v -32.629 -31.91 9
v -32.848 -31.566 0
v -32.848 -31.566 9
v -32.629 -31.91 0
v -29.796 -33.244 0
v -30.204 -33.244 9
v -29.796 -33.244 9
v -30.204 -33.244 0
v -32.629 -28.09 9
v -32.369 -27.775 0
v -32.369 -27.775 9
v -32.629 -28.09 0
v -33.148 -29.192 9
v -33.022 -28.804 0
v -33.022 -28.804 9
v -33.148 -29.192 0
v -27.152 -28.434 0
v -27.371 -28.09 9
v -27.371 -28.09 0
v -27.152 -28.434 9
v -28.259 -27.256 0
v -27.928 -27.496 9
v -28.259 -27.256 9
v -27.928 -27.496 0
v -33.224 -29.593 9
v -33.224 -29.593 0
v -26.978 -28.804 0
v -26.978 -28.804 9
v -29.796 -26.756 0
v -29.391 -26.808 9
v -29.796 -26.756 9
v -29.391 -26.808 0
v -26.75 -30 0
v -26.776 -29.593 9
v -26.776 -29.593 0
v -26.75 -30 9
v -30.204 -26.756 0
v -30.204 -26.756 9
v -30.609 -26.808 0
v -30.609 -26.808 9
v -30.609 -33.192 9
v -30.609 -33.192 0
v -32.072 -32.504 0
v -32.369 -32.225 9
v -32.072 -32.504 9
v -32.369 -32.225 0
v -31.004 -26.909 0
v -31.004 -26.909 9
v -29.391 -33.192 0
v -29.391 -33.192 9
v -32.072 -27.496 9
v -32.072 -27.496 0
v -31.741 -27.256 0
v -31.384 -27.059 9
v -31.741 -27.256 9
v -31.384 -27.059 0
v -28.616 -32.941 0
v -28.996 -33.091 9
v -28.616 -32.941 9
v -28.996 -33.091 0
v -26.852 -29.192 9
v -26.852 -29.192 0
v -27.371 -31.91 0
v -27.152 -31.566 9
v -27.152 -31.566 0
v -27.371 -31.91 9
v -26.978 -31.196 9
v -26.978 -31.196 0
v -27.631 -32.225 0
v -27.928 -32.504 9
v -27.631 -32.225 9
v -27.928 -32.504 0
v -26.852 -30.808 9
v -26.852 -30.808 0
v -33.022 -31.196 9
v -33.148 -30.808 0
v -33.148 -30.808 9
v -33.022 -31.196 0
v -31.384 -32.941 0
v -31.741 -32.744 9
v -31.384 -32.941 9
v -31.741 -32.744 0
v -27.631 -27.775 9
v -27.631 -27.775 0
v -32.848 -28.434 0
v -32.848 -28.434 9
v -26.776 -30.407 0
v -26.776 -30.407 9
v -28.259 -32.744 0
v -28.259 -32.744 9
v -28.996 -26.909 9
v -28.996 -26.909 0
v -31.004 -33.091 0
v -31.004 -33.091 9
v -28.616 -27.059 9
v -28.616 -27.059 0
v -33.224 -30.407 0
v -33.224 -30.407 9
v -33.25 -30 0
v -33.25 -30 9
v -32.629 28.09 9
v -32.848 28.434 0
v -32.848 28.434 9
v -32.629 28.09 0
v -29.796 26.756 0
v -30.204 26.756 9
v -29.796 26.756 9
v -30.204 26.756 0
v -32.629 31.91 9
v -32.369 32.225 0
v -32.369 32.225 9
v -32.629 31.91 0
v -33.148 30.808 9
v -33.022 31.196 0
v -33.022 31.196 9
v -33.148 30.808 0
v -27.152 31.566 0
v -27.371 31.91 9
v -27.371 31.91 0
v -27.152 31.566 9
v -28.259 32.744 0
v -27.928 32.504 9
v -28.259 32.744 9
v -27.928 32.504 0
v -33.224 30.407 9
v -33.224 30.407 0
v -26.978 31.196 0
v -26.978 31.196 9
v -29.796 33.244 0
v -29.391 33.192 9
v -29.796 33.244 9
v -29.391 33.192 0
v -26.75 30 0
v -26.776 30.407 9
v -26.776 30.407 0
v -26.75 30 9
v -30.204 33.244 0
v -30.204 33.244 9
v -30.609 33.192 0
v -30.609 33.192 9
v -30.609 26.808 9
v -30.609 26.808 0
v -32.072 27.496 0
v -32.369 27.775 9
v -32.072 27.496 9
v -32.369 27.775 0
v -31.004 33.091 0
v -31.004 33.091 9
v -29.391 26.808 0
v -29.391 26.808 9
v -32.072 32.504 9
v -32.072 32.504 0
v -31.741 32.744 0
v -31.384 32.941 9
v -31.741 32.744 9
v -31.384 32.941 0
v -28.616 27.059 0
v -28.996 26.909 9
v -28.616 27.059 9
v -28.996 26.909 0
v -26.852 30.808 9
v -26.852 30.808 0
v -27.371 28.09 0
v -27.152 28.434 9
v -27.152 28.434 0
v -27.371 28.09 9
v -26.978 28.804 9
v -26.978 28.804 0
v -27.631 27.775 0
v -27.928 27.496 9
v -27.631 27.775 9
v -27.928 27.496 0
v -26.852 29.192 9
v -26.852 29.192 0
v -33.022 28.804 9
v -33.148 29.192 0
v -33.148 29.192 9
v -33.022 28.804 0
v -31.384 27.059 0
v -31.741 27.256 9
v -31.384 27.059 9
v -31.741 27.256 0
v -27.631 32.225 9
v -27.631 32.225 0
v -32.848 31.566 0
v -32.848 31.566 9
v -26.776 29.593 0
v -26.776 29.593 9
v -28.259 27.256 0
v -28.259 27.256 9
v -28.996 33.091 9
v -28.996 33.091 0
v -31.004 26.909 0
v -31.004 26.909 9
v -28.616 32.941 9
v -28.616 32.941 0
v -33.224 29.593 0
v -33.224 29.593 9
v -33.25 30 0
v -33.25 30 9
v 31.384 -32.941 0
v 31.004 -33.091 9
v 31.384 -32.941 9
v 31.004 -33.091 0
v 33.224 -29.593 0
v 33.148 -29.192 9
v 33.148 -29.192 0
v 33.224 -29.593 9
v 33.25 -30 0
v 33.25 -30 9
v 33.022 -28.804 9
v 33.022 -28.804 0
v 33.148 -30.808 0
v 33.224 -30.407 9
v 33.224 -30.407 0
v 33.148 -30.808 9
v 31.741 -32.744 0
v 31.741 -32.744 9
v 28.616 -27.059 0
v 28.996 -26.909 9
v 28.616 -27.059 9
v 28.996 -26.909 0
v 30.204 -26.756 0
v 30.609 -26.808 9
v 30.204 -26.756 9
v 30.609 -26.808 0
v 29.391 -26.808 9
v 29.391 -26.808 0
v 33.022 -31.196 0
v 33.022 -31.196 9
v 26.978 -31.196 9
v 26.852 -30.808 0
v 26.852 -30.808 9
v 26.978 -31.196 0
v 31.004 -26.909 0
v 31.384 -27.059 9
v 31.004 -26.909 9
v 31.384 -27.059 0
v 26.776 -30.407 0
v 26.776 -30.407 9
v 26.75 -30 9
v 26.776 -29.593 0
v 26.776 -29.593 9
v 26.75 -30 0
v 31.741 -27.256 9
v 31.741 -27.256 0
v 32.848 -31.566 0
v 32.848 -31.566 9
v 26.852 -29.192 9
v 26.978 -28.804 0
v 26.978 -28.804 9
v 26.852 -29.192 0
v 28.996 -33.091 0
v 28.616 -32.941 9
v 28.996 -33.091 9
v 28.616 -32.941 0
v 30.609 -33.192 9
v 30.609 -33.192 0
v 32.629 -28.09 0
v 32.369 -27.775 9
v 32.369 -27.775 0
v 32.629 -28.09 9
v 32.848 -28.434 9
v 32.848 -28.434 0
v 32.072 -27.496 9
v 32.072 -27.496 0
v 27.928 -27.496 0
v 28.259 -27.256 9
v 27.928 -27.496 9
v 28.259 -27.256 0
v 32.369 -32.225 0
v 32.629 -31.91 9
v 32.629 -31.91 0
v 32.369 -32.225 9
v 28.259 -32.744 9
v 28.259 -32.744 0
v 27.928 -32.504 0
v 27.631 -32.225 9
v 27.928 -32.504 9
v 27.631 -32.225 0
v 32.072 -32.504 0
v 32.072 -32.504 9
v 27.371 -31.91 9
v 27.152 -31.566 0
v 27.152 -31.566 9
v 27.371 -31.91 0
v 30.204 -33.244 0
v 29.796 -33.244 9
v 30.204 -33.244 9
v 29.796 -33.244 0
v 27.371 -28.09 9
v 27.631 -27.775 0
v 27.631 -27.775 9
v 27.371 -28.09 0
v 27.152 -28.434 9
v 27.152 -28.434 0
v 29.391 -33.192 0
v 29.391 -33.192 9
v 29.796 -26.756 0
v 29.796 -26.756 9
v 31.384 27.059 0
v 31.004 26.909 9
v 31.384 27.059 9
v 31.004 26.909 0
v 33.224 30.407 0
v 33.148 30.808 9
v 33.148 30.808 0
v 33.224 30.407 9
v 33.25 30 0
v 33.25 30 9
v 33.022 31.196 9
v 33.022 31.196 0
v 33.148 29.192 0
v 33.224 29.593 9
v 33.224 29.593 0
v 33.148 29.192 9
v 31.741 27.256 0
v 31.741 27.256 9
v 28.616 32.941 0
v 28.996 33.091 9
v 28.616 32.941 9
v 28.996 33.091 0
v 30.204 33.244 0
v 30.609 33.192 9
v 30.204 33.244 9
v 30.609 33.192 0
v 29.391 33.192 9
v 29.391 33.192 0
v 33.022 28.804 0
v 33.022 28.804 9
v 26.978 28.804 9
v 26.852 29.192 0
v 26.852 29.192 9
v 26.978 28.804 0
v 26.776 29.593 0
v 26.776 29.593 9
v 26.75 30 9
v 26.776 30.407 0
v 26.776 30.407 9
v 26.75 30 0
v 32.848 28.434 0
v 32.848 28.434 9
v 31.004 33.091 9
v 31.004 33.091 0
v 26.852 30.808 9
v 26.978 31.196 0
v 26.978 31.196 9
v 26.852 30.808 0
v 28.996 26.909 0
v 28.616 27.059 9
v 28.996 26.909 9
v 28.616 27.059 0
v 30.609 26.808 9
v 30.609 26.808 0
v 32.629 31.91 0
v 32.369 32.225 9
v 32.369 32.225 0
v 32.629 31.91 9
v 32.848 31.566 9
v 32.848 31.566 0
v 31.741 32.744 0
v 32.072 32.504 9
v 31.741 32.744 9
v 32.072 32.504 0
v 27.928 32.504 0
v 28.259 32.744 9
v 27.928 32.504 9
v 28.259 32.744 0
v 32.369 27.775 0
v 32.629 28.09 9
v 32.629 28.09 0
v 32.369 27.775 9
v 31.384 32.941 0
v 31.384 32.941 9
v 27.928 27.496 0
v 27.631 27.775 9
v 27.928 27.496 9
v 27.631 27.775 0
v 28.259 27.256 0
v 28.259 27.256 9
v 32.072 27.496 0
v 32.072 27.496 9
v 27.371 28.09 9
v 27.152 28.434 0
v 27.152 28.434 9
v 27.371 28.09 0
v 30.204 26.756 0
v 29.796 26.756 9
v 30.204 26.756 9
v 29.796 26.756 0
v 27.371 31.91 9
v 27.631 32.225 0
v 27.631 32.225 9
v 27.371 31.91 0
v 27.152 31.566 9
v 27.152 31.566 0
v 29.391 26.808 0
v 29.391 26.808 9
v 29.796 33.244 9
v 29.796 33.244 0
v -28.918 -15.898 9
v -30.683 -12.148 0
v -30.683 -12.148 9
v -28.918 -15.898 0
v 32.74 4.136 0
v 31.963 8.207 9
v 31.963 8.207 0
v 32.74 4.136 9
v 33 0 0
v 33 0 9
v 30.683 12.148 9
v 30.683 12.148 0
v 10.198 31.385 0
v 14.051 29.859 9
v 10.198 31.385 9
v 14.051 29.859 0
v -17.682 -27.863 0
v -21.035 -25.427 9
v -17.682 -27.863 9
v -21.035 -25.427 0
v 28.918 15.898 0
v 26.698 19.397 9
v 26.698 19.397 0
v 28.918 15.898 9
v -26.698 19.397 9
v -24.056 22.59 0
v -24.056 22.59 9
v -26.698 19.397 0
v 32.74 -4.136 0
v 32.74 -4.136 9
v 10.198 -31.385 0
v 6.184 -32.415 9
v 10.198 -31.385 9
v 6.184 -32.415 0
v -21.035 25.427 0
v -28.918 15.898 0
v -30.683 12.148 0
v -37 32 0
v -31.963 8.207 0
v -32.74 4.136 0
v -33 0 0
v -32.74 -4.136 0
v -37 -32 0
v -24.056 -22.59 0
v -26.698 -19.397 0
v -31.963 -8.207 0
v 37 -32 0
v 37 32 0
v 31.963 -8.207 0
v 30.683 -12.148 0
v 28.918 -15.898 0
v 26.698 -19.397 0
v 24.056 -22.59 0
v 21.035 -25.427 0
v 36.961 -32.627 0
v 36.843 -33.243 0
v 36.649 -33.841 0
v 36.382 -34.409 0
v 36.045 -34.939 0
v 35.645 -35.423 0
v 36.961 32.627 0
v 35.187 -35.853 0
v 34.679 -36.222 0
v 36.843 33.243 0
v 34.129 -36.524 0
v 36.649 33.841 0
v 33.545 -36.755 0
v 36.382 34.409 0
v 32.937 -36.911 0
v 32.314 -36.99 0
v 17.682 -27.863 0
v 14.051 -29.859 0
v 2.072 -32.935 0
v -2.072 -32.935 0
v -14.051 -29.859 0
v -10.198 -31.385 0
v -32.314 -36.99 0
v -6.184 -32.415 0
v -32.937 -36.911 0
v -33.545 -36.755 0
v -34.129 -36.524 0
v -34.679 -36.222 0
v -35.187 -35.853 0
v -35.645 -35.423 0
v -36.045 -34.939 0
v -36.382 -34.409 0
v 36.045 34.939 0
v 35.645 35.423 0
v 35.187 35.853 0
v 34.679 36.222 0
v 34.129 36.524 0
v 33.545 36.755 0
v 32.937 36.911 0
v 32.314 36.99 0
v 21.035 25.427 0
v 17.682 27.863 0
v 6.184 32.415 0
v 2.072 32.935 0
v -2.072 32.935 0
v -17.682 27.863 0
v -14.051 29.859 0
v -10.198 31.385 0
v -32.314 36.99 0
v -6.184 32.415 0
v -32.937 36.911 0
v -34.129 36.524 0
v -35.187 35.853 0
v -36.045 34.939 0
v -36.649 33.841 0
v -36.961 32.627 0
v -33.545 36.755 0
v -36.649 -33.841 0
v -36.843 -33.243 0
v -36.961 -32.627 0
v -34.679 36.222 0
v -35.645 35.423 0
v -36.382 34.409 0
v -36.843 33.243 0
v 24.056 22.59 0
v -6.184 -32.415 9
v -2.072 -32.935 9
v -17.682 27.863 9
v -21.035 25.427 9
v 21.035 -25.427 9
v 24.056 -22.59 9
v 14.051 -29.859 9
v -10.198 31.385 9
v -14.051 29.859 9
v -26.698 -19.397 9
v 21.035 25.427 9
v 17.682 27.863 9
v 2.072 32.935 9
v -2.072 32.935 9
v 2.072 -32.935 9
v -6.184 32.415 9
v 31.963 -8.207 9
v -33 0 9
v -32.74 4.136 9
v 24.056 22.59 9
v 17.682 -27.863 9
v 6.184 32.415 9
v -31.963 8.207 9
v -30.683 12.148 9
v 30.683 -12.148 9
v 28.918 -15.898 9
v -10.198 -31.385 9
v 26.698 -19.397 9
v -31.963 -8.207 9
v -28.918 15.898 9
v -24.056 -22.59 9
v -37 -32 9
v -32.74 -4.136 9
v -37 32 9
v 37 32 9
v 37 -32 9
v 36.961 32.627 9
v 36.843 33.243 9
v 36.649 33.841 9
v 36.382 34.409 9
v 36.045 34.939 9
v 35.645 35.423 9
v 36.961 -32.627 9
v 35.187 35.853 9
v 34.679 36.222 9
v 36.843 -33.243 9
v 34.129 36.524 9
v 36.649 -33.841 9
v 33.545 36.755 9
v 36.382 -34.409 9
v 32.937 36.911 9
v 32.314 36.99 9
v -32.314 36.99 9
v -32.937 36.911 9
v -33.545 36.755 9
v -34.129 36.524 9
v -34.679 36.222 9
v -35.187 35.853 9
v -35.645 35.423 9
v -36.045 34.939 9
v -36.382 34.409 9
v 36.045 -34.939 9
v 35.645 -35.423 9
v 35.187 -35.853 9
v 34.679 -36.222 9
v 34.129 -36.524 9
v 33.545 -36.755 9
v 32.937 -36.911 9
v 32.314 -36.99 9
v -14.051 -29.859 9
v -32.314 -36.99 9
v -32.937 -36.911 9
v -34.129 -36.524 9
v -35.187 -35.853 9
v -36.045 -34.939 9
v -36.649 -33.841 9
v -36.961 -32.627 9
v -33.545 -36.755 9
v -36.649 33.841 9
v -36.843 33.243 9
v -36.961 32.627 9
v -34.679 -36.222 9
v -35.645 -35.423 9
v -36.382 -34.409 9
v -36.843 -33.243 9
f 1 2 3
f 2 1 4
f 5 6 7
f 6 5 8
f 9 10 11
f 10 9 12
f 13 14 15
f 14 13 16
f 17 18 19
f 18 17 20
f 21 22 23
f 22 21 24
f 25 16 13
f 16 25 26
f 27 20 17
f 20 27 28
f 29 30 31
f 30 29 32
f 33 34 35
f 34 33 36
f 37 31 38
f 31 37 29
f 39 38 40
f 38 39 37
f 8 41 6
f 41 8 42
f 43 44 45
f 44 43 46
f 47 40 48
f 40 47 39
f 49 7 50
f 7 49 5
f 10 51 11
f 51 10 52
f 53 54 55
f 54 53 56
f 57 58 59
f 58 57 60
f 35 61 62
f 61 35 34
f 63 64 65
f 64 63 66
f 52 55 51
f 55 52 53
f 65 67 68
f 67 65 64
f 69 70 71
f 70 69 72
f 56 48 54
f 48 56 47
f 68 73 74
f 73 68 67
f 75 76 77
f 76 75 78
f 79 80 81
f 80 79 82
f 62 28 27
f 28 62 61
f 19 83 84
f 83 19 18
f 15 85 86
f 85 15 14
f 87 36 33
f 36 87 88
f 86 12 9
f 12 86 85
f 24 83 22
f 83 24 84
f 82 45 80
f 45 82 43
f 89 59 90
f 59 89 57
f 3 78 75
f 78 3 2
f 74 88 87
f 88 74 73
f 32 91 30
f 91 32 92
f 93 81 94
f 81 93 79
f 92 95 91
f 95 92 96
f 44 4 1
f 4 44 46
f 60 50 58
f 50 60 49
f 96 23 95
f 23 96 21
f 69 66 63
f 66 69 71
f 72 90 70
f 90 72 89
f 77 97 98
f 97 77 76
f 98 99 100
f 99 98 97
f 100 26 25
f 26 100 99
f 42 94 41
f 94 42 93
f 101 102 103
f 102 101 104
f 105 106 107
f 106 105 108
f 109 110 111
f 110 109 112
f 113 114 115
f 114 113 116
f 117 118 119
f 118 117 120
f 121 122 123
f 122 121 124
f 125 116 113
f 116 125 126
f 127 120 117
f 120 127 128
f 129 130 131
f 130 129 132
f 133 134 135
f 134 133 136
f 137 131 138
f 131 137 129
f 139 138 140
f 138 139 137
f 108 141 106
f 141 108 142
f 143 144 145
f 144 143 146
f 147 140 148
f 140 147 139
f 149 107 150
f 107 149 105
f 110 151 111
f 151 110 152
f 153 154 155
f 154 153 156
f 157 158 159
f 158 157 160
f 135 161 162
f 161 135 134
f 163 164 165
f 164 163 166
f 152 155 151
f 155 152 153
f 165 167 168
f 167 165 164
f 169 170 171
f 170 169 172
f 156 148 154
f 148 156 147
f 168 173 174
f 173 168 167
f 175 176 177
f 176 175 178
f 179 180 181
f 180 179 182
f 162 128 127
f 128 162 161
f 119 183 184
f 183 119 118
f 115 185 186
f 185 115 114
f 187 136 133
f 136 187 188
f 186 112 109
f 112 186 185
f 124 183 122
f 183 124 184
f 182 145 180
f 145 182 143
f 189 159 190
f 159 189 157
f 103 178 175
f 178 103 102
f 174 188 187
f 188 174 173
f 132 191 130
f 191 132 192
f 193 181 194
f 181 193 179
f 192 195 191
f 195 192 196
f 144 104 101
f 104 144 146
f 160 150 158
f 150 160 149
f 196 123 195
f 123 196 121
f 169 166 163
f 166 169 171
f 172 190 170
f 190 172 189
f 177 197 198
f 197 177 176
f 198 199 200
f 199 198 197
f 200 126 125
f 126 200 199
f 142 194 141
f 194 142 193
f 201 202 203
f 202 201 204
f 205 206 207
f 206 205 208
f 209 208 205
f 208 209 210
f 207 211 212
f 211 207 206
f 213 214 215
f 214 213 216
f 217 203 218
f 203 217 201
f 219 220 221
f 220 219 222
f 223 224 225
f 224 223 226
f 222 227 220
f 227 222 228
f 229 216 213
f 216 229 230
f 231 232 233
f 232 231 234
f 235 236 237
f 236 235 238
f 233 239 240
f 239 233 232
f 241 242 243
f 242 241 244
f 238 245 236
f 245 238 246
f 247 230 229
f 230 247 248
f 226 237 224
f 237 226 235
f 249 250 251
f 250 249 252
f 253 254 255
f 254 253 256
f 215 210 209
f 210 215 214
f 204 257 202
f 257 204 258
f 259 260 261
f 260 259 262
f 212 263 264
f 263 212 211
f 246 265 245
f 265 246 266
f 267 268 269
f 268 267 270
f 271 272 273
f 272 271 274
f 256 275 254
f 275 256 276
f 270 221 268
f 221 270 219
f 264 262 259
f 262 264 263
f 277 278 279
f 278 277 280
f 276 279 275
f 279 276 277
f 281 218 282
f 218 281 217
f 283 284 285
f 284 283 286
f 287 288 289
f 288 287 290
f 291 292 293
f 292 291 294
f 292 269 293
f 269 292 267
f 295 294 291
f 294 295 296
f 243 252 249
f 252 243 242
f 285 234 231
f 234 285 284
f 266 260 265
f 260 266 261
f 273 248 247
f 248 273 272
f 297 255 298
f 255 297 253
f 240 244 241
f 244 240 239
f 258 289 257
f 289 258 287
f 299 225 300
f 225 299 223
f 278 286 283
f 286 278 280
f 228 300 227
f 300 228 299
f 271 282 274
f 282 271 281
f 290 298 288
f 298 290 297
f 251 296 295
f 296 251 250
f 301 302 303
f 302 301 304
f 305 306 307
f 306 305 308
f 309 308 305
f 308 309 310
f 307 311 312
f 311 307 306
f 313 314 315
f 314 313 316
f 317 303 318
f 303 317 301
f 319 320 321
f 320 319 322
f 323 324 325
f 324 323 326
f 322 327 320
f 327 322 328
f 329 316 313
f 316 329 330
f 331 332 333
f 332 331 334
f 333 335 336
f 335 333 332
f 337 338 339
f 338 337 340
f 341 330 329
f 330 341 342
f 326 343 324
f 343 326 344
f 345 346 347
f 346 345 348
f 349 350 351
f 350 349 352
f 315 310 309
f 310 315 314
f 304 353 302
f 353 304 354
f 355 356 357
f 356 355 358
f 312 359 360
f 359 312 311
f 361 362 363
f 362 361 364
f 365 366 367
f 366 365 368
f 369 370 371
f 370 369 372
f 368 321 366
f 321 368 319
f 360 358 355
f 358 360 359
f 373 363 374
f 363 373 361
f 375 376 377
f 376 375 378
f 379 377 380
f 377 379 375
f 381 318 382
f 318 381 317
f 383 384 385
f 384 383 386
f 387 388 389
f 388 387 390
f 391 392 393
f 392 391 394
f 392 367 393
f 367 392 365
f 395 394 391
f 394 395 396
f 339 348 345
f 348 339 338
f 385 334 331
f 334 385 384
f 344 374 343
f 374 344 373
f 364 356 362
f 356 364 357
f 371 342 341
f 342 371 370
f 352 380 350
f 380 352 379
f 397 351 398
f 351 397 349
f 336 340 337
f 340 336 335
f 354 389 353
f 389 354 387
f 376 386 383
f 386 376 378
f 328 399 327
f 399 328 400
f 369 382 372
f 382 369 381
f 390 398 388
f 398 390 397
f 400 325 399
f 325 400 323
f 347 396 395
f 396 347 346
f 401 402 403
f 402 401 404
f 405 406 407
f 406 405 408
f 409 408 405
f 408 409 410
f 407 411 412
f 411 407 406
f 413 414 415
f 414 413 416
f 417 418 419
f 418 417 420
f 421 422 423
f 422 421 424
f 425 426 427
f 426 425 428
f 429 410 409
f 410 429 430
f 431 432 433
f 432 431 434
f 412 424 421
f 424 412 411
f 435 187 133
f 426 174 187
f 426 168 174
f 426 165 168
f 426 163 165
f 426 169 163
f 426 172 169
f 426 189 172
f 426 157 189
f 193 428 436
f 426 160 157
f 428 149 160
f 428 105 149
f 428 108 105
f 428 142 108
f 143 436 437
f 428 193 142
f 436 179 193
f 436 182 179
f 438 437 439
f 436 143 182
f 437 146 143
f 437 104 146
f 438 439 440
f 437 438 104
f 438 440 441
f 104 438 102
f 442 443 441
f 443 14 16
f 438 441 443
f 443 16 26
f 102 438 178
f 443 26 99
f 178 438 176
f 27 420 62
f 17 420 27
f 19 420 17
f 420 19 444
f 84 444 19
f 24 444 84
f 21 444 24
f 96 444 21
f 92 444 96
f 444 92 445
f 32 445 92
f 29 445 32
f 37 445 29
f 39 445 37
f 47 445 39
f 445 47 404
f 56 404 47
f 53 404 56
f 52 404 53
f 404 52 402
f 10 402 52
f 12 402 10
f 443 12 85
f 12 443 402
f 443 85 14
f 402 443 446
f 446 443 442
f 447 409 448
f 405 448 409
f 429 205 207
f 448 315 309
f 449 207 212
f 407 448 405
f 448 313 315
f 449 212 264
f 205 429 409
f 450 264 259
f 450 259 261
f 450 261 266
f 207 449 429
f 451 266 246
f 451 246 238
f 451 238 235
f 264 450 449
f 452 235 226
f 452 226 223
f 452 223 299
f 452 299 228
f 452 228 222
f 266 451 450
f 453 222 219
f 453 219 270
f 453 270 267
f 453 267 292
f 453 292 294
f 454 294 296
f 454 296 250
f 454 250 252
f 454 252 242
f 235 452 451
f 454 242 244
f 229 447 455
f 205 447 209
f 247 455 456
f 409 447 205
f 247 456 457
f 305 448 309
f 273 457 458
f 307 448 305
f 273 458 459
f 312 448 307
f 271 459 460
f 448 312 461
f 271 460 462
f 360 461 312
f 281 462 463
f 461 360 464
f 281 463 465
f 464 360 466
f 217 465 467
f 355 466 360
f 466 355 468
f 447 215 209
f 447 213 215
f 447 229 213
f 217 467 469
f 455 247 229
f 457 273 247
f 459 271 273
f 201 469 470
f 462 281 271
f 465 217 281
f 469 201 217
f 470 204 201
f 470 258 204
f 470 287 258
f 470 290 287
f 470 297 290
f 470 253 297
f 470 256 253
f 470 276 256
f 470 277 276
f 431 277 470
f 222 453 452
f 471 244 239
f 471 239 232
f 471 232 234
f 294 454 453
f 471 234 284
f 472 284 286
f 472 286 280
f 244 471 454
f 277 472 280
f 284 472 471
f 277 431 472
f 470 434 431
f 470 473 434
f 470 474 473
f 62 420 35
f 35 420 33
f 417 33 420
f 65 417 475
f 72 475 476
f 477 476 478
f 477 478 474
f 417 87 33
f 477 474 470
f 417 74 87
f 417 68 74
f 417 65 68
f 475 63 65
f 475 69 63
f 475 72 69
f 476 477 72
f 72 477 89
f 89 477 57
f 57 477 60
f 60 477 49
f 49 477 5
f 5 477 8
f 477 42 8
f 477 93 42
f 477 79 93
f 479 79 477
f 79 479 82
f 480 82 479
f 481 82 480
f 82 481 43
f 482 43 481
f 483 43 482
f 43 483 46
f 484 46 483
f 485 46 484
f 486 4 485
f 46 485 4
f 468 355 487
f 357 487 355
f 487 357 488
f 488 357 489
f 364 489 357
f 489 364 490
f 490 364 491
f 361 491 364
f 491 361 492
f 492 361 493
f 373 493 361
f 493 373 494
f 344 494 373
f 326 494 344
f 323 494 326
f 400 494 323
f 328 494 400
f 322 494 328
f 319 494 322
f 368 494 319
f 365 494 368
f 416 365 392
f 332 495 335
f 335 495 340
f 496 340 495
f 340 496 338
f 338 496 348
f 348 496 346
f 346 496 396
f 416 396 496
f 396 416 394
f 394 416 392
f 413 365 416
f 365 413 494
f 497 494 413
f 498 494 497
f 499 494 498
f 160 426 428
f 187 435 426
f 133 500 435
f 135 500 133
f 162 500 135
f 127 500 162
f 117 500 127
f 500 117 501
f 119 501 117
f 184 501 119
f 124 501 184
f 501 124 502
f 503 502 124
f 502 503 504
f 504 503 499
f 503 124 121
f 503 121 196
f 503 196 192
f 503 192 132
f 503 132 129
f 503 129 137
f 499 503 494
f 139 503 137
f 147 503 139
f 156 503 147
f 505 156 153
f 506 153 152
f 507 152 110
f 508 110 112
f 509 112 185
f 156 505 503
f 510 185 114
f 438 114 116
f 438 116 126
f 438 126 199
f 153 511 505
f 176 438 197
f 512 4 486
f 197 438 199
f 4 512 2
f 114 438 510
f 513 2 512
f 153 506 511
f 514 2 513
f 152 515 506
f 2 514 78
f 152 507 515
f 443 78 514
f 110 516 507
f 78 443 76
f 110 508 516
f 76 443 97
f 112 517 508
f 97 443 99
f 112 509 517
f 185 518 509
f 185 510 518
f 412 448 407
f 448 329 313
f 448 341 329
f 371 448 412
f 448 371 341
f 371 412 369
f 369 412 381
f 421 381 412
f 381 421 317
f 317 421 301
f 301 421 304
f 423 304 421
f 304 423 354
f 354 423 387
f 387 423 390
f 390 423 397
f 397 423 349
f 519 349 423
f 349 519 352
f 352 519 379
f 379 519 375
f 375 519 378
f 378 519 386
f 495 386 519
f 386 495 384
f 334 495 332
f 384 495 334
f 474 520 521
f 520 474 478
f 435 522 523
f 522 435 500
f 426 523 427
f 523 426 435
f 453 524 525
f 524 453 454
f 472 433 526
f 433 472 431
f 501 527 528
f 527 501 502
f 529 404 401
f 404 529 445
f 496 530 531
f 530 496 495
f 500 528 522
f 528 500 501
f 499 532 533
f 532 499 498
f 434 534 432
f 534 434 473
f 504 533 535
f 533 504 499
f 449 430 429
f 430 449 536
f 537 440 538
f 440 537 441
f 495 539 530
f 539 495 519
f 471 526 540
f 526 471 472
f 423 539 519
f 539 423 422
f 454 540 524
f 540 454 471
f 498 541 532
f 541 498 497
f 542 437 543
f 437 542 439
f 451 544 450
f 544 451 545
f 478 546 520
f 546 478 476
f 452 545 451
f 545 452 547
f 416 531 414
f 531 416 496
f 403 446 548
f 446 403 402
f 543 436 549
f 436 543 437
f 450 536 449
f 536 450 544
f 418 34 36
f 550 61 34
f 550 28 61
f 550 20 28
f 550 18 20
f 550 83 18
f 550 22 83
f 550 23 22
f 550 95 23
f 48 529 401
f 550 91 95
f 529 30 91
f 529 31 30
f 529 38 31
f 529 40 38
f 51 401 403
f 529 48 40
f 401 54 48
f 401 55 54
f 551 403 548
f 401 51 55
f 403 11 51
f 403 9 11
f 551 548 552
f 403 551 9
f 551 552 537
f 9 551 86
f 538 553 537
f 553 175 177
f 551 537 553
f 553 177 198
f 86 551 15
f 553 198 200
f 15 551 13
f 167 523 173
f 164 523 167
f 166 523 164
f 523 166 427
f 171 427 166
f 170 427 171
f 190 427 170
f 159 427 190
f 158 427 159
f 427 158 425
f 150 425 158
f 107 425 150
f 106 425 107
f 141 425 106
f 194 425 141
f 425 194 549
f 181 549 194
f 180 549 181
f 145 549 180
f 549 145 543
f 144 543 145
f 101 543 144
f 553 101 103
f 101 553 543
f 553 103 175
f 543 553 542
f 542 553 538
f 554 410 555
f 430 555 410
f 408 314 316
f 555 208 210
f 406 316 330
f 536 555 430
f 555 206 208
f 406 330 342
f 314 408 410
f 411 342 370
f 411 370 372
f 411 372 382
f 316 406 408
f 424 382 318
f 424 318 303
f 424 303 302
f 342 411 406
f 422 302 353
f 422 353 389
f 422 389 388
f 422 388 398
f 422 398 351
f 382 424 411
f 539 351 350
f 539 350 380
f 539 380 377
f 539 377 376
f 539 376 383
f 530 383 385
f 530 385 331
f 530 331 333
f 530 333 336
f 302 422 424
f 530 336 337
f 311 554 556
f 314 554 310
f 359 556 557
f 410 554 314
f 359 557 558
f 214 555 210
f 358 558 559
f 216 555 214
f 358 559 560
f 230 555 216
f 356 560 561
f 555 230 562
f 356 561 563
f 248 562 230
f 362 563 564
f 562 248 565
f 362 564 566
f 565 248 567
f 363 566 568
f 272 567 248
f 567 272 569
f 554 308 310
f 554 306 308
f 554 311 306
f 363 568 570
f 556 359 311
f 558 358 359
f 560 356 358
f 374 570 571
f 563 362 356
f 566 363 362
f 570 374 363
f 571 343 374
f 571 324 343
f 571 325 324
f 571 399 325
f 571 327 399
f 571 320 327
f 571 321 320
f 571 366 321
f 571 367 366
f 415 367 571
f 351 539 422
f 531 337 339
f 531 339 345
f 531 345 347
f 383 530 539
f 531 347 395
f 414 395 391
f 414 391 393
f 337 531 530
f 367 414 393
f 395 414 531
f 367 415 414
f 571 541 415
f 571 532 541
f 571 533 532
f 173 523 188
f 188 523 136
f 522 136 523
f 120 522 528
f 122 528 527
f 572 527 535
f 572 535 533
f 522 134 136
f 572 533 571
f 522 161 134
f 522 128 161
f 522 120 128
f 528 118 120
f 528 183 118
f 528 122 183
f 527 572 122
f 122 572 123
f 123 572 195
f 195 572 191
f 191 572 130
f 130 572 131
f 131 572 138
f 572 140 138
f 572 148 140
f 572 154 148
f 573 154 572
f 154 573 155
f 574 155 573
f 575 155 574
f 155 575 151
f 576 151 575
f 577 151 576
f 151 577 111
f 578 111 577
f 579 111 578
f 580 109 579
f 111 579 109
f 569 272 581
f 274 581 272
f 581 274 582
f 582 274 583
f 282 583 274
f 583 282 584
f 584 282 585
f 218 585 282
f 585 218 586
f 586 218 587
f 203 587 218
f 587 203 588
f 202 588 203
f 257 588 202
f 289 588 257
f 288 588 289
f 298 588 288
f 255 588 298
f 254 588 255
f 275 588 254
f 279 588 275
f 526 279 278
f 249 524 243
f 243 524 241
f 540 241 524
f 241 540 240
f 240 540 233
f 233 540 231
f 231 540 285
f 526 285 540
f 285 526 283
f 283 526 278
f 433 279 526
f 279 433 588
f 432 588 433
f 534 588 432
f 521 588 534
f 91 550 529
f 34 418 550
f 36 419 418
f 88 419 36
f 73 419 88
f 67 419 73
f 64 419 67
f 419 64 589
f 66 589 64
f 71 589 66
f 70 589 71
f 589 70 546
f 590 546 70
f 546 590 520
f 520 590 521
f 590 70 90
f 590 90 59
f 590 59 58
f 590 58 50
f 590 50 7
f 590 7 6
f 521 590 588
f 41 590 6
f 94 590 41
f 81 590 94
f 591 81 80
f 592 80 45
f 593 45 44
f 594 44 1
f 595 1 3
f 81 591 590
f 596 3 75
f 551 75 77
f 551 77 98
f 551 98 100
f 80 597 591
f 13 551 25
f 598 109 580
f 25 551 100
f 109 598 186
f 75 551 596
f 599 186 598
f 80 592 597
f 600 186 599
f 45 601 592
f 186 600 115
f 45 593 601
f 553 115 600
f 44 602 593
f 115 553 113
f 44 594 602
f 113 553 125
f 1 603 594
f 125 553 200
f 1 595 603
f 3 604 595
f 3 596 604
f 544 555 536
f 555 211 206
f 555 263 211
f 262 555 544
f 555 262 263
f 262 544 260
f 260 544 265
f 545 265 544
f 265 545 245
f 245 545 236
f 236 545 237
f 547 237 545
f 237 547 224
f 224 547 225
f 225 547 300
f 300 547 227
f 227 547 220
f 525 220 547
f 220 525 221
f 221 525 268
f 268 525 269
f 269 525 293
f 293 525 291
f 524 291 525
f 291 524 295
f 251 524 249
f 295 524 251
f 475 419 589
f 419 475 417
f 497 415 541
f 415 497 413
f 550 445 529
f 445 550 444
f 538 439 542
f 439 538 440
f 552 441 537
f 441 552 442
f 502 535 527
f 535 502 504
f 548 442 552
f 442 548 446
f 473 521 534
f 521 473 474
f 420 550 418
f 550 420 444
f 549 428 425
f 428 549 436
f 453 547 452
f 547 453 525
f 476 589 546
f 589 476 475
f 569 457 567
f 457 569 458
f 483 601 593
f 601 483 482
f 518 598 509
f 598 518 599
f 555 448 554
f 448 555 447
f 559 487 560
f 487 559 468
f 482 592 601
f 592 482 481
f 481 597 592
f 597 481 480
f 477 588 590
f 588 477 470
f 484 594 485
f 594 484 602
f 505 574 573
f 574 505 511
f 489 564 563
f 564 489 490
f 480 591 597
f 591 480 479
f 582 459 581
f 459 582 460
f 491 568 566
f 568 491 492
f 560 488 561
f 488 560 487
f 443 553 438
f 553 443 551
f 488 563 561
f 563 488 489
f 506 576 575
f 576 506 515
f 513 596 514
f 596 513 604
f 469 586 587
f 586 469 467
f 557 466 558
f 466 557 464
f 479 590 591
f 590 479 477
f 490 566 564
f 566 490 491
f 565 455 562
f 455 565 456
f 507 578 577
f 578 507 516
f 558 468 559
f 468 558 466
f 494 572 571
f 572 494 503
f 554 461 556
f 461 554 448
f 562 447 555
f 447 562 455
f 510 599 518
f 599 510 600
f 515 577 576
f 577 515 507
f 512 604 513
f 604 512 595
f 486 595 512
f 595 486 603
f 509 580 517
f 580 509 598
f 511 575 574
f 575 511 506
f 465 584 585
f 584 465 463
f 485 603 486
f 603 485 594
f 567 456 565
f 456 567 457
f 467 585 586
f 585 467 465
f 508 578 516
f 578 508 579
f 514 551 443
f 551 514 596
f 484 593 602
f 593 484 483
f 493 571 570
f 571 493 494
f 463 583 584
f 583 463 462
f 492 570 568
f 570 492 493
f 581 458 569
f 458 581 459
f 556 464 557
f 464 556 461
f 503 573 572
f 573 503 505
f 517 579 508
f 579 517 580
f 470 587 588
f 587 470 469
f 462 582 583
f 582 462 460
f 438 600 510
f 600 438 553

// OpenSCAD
$fn = 50;


difference() {
	union() {
		hull() {
			translate(v = [-32.0000000000, 32.0000000000, 0]) {
				cylinder(h = 9, r = 5);
			}
			translate(v = [32.0000000000, 32.0000000000, 0]) {
				cylinder(h = 9, r = 5);
			}
			translate(v = [-32.0000000000, -32.0000000000, 0]) {
				cylinder(h = 9, r = 5);
			}
			translate(v = [32.0000000000, -32.0000000000, 0]) {
				cylinder(h = 9, r = 5);
			}
		}
	}
	union() {
		#translate(v = [-30.0000000000, -30.0000000000, -100.0000000000]) {
			cylinder(h = 200, r = 3.2500000000);
		}
		#translate(v = [-30.0000000000, 30.0000000000, -100.0000000000]) {
			cylinder(h = 200, r = 3.2500000000);
		}
		#translate(v = [30.0000000000, -30.0000000000, -100.0000000000]) {
			cylinder(h = 200, r = 3.2500000000);
		}
		#translate(v = [30.0000000000, 30.0000000000, -100.0000000000]) {
			cylinder(h = 200, r = 3.2500000000);
		}
		#cylinder(h = 9, r = 33.0000000000);
	}
}
